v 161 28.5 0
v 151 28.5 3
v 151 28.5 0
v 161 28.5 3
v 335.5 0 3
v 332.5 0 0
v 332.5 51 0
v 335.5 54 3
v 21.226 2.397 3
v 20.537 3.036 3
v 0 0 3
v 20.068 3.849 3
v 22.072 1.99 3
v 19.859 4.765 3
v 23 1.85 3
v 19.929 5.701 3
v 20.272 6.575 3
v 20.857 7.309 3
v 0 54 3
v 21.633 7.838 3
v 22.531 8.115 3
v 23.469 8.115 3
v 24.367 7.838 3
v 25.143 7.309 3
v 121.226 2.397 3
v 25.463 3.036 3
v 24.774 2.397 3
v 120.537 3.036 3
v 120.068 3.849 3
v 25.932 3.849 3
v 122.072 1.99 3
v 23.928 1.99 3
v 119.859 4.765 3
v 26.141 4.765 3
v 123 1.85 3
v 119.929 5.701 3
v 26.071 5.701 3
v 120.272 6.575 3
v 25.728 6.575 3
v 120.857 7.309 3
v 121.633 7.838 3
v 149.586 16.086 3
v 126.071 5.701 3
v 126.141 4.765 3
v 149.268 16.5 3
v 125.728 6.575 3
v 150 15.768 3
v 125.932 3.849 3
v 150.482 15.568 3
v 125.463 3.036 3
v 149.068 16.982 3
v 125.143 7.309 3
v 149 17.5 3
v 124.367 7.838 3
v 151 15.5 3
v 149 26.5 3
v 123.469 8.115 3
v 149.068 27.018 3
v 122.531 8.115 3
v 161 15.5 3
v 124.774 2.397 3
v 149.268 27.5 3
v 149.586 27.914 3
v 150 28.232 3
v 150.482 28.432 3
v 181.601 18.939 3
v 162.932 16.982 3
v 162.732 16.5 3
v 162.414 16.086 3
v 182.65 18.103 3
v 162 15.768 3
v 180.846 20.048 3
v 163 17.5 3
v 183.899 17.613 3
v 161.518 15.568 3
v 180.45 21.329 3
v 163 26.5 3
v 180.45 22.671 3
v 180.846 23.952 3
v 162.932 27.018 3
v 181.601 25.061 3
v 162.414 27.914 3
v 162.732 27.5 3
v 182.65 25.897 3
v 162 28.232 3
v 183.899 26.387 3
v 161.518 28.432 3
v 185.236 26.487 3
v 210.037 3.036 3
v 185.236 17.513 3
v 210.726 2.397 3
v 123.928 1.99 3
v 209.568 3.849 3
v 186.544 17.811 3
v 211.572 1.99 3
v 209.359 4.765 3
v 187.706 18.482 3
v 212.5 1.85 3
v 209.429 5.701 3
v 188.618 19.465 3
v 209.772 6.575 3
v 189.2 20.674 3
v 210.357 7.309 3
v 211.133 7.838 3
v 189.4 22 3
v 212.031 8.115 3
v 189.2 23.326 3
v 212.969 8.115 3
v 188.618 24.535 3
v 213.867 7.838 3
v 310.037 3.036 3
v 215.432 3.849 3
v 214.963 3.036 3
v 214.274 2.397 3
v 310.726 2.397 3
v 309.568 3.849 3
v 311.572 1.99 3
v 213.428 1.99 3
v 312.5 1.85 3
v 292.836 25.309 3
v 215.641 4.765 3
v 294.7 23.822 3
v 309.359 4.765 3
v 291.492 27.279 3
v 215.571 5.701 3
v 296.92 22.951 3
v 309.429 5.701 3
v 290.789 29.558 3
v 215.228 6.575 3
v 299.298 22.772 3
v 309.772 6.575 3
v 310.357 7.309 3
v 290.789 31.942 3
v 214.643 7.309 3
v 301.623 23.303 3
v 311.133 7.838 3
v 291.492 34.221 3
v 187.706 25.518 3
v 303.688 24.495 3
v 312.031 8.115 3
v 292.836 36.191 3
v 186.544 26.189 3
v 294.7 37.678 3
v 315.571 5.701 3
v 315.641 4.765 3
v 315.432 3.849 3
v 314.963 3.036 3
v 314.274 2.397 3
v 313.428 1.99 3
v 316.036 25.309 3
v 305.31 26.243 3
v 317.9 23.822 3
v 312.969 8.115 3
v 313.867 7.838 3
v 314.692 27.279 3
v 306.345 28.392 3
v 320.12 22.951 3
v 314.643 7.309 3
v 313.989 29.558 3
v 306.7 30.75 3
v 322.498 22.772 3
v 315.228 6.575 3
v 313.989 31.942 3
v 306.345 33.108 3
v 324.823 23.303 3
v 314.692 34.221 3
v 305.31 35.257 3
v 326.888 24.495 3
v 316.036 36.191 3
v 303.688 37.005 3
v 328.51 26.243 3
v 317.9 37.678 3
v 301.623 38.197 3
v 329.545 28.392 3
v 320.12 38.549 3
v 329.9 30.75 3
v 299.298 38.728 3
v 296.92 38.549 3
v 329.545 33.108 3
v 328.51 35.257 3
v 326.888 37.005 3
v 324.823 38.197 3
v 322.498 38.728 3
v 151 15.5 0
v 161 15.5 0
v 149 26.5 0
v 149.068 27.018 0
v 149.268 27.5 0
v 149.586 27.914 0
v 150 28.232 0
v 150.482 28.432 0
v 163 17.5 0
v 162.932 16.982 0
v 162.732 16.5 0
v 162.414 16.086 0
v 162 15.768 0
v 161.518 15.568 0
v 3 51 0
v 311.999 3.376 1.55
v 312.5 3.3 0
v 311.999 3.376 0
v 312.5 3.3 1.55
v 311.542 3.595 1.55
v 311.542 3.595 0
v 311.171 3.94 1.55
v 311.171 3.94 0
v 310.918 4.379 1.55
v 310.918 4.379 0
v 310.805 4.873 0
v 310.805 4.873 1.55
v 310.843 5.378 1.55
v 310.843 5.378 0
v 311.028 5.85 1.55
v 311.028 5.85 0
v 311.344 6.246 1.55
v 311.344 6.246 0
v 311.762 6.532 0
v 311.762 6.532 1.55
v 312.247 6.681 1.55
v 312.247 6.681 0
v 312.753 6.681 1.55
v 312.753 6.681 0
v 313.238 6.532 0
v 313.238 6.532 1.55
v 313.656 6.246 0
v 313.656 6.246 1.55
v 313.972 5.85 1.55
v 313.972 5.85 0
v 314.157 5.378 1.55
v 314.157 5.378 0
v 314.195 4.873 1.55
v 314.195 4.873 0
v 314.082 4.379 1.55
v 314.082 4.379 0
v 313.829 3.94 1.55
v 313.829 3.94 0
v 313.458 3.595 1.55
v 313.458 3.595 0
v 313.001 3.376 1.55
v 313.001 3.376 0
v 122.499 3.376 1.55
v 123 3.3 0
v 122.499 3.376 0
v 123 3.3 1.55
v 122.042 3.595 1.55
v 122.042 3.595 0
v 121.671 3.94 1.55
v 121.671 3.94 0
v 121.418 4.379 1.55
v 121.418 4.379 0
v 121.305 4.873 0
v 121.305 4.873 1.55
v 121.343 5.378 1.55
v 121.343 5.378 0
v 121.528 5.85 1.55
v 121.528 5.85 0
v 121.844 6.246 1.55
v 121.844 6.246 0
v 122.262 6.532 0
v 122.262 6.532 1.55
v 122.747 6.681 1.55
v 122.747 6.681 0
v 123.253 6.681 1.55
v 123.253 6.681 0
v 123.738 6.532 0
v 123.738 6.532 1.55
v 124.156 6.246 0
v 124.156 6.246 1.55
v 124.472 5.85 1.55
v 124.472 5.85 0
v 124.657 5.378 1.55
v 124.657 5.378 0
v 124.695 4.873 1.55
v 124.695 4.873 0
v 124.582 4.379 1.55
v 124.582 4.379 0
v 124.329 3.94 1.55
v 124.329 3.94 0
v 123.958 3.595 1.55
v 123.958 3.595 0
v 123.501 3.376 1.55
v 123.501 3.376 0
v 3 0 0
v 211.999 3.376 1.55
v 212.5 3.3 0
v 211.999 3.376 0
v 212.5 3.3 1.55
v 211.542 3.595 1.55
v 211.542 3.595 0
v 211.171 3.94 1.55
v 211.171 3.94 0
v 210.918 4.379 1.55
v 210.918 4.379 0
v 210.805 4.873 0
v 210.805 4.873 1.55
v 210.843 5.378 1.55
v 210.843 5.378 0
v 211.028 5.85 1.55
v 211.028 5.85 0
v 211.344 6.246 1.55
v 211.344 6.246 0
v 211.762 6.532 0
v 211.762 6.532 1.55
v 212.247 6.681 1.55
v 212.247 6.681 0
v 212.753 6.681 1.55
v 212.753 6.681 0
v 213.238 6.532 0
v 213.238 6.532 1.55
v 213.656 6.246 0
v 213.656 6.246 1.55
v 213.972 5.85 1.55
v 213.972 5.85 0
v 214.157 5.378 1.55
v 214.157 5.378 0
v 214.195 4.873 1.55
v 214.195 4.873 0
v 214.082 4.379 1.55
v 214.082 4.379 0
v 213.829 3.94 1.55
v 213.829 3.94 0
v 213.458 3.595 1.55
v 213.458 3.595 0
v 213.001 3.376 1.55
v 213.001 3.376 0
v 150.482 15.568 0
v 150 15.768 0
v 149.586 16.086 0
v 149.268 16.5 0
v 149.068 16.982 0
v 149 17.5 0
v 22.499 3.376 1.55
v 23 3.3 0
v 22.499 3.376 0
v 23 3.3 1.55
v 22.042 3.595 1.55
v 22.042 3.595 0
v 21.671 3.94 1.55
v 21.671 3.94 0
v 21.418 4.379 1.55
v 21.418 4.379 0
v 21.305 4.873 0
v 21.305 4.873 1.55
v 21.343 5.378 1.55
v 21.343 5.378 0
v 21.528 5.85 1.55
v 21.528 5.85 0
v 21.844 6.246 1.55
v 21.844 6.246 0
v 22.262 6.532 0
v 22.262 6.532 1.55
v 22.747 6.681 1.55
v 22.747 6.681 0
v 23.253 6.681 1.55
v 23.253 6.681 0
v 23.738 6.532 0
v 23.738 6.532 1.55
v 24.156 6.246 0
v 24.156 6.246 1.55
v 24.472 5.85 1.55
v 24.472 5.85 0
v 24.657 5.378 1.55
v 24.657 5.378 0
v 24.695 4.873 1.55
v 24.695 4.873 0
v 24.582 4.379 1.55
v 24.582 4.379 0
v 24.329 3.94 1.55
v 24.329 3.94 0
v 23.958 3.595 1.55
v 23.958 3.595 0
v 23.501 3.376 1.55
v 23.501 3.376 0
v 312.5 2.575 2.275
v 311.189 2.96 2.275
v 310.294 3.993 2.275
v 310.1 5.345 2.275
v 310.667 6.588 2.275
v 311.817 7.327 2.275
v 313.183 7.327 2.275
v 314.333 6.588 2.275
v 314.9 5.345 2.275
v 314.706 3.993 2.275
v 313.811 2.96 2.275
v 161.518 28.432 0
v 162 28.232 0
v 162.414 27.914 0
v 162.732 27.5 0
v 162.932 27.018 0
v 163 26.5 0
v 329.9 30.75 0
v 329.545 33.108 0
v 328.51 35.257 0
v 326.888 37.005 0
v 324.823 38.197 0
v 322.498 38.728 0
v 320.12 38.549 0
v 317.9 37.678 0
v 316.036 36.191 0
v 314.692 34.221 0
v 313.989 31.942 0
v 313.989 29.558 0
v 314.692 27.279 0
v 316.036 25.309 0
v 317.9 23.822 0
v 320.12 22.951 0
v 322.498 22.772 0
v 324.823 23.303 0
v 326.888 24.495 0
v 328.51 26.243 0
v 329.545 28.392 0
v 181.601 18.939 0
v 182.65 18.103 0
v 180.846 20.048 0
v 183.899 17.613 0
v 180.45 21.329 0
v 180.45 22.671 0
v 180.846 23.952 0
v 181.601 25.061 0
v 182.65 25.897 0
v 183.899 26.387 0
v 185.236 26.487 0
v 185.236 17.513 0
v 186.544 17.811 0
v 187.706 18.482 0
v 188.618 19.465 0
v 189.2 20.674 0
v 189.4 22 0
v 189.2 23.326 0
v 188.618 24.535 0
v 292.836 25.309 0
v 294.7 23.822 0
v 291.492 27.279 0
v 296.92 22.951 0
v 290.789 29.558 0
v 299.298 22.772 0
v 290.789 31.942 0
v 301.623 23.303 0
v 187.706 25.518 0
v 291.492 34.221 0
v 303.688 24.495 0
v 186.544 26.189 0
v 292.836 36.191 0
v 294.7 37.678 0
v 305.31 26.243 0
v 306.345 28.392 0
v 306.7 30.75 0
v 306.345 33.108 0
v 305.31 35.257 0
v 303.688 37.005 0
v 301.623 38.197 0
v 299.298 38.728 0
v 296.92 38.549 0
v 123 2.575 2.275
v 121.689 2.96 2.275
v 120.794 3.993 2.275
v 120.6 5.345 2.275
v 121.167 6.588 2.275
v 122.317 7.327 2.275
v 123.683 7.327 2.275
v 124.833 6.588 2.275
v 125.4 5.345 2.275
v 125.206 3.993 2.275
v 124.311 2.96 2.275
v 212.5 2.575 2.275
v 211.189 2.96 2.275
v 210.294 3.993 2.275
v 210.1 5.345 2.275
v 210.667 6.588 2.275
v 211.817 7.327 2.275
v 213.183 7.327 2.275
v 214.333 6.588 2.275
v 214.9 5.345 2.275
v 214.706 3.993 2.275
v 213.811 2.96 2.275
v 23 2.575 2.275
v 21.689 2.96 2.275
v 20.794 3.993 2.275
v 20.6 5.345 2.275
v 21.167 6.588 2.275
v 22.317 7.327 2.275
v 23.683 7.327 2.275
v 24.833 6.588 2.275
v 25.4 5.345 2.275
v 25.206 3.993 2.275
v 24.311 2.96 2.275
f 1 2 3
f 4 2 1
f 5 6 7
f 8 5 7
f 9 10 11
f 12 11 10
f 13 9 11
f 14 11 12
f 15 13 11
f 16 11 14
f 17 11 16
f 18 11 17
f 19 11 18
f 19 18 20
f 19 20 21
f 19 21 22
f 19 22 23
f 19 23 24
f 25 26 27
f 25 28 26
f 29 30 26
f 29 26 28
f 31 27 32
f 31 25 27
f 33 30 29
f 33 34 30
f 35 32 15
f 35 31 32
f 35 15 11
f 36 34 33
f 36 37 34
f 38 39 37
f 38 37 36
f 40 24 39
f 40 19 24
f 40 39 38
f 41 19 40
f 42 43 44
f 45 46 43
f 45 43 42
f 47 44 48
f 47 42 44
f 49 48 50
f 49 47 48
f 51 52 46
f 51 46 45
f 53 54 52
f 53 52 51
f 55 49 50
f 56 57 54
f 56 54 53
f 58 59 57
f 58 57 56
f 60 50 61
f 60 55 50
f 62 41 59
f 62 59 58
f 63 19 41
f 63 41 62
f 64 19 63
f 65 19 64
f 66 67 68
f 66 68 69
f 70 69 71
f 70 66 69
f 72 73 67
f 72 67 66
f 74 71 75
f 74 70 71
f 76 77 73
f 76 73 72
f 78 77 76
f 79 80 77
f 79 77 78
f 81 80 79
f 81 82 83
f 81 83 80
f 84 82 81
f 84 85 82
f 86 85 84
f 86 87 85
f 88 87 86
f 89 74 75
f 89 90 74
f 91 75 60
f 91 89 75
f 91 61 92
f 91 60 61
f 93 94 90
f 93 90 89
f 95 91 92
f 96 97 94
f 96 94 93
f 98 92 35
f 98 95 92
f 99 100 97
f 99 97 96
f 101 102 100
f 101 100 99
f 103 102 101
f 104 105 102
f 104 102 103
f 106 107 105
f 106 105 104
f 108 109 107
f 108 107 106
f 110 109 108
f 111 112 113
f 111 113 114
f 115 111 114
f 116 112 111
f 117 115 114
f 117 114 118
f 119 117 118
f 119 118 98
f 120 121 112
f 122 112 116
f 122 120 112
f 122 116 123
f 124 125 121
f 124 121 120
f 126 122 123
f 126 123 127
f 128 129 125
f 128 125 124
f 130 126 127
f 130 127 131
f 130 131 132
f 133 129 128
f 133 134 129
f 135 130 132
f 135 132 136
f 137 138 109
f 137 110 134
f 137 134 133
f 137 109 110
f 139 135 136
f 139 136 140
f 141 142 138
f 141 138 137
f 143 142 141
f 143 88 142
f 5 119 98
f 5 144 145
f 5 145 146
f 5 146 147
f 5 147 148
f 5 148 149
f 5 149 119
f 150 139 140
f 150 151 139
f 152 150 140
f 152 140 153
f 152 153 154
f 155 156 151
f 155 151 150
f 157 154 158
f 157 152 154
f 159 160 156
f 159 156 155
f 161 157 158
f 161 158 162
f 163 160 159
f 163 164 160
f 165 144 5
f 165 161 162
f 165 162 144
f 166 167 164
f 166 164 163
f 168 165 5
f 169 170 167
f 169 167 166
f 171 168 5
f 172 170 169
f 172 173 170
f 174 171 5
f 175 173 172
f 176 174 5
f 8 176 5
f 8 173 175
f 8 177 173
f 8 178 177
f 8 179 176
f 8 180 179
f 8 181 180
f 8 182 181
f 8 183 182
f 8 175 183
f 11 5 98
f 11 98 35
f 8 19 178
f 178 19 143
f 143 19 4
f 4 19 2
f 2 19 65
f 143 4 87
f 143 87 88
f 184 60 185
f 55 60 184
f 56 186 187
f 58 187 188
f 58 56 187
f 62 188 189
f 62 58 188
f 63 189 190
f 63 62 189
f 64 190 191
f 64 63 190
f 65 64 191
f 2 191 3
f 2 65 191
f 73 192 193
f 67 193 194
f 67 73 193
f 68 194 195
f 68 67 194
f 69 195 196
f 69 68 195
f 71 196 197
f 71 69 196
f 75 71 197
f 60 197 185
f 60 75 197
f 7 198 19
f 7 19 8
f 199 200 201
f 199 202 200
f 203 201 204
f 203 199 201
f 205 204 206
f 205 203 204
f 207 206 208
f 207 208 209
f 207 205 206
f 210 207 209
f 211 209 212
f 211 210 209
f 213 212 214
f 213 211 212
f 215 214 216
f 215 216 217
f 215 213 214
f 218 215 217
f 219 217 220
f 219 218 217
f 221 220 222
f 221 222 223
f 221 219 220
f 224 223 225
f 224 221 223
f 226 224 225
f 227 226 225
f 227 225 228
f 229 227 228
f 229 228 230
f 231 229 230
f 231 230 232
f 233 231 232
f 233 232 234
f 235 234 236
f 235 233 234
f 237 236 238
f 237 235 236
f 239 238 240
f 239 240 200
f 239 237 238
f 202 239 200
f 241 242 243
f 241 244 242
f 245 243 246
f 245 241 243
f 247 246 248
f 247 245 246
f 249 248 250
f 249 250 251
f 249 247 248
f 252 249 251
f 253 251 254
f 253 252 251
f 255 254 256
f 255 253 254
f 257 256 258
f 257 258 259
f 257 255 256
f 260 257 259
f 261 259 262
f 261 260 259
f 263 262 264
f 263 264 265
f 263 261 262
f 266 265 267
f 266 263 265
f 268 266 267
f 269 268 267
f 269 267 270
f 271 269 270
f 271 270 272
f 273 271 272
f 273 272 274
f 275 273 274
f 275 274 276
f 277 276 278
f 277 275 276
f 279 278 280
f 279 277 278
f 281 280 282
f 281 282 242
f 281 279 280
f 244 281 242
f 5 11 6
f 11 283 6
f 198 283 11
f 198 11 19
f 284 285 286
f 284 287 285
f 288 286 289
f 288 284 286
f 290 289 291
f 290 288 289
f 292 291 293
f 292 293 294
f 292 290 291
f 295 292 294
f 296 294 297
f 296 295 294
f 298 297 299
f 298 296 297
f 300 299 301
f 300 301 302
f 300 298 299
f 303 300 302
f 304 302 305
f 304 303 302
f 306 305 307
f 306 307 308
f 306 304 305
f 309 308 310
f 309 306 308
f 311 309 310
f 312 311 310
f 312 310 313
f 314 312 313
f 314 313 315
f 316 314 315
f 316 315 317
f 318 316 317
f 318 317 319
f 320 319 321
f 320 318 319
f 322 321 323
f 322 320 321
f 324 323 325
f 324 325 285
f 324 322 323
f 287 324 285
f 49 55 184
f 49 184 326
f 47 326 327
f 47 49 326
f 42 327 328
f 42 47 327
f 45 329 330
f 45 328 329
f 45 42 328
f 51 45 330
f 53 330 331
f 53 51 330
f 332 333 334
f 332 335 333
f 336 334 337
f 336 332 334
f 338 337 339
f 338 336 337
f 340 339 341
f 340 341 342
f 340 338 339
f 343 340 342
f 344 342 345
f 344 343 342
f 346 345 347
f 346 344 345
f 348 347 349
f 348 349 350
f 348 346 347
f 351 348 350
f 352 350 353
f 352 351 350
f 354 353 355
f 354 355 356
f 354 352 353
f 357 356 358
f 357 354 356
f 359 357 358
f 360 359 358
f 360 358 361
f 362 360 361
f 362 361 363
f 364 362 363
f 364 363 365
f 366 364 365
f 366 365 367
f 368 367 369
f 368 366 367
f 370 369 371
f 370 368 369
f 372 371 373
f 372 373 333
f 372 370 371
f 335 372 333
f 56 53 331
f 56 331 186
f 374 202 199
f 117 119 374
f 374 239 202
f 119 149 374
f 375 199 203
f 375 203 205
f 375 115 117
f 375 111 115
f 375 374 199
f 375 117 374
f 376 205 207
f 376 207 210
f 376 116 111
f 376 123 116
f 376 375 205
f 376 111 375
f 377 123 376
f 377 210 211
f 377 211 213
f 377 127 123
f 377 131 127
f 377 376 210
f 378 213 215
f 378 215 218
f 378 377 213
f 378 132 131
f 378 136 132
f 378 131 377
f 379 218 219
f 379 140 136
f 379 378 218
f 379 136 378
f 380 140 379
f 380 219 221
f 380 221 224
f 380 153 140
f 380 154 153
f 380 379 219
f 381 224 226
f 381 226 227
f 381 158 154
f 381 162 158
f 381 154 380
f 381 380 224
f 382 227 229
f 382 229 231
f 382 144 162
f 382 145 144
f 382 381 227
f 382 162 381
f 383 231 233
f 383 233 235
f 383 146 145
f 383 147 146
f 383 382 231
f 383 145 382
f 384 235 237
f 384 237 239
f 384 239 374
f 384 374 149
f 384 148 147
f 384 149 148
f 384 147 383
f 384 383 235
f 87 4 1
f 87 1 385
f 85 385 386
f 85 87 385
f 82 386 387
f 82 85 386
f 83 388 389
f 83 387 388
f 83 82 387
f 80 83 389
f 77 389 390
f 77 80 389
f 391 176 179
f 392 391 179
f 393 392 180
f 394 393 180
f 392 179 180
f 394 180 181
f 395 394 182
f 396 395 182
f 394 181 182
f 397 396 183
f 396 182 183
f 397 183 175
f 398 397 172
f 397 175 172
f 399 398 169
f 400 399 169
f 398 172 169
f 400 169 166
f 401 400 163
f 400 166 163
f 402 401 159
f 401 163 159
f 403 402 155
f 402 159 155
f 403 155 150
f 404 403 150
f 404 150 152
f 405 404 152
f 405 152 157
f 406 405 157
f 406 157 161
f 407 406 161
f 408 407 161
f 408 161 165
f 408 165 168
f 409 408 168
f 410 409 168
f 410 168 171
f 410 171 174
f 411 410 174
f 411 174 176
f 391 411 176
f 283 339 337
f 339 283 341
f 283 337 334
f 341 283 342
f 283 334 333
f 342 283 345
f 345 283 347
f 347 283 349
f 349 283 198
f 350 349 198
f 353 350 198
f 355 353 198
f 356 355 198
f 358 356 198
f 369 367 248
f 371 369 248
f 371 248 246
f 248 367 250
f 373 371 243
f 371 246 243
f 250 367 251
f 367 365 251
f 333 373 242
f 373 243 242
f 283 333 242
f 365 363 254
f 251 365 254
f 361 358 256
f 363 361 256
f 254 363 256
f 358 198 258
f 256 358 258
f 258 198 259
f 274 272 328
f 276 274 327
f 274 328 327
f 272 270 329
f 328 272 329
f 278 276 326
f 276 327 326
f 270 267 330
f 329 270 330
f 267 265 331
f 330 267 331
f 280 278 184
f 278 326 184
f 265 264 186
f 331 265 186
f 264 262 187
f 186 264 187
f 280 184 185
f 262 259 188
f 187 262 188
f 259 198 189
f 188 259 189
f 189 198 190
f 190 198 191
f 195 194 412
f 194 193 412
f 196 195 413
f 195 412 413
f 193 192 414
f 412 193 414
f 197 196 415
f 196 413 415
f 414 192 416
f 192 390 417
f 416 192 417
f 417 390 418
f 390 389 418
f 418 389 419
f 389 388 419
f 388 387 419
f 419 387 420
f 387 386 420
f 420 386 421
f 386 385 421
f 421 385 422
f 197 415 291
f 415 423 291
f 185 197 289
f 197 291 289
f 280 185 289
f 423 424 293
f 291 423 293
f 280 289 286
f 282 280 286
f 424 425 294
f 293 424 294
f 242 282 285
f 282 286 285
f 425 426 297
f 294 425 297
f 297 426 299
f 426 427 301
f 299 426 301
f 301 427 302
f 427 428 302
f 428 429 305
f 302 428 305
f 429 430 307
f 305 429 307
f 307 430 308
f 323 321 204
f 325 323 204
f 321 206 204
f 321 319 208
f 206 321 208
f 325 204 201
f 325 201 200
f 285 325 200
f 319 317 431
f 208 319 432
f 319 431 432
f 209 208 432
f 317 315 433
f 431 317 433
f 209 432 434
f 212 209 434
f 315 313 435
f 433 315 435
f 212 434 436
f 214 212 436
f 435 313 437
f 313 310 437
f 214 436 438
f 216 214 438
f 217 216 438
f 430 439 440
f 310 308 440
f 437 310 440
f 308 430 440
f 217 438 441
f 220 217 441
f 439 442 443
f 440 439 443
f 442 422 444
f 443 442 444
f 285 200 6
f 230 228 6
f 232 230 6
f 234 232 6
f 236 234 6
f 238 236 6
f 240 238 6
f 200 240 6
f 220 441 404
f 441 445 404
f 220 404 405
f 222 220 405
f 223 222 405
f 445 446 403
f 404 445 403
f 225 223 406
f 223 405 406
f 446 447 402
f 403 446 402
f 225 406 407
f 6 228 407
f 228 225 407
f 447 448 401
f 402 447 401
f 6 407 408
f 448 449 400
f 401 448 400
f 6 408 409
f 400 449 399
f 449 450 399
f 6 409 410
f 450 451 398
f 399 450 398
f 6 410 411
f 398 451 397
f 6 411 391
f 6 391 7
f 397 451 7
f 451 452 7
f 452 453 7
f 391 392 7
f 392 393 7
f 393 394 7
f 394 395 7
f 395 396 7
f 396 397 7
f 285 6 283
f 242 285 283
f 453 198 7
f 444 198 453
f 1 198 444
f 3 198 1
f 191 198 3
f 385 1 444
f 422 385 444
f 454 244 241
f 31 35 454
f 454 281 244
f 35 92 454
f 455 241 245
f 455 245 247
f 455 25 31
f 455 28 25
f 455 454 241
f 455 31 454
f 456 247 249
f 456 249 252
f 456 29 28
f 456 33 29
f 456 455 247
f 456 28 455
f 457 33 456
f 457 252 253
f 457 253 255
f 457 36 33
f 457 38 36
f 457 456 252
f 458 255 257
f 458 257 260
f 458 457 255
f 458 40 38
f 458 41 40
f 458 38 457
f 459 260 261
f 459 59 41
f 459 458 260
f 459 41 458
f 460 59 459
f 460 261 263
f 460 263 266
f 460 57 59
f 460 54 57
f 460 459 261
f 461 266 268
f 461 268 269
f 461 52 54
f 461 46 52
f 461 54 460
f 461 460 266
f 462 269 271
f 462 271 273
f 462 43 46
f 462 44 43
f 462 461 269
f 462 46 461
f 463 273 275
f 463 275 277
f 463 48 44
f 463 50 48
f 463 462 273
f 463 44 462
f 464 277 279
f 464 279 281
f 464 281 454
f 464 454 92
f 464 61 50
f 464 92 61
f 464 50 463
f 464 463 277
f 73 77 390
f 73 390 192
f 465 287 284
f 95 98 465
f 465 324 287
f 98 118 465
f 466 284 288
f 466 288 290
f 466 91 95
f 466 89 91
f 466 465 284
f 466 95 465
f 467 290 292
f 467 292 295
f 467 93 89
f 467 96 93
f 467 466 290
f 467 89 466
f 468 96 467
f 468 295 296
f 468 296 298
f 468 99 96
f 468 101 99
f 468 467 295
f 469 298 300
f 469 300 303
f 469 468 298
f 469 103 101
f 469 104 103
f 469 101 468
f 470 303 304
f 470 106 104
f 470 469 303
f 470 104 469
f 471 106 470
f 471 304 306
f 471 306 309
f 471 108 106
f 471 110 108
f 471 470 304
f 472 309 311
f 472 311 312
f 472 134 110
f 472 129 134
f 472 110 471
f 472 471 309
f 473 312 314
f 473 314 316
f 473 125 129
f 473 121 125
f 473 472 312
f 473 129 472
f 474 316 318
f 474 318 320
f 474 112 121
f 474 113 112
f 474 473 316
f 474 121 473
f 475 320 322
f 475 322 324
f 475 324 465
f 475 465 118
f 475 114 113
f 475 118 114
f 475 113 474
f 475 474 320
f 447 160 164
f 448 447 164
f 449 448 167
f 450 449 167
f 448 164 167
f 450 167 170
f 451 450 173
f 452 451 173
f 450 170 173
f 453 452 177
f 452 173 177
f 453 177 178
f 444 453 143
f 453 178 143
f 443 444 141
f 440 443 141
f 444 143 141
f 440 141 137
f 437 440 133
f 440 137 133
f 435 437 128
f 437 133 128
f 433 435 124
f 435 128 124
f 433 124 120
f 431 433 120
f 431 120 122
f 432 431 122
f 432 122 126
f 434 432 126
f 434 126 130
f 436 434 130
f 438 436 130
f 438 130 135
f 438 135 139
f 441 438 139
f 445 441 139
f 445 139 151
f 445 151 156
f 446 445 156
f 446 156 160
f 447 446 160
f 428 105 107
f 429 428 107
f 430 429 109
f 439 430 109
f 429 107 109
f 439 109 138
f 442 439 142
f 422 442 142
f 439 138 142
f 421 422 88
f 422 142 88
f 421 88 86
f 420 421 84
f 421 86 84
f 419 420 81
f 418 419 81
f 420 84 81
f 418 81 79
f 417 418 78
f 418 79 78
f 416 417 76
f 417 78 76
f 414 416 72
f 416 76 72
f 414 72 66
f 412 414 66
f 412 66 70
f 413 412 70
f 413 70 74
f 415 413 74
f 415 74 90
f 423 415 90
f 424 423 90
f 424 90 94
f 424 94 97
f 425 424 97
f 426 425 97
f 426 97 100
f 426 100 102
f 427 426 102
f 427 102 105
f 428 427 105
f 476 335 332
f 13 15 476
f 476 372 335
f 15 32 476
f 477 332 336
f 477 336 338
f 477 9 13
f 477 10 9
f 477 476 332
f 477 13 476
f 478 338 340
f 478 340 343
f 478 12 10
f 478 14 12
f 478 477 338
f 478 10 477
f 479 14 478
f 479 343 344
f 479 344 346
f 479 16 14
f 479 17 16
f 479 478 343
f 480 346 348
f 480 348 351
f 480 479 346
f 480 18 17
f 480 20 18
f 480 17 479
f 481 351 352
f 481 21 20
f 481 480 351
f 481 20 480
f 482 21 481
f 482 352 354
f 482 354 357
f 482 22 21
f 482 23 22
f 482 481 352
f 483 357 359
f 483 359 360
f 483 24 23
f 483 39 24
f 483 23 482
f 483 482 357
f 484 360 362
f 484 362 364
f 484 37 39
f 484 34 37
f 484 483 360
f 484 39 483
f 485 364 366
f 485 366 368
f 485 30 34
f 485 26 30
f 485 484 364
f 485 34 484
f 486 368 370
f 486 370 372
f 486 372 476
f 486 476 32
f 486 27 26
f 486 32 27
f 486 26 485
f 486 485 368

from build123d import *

# Parameters (mm, degrees)
SKETCH1_W                                      = 335.5
SKETCH1_H                                      = 54
BOSS_EXTRUDE1_DEPTH                            = 3
CHAMFER1_SIZE                                  = 3
CSK_FOR_M3_FLAT_HEAD_MACHINE_SCREW1_AT_2_COUNT = 2
CSK_FOR_M3_FLAT_HEAD_MACHINE_SCREW1_AT_2_PITCH = 100
CSK_FOR_M3_FLAT_HEAD_MACHINE_SCREW1_AT_3_COUNT = 2
CSK_FOR_M3_FLAT_HEAD_MACHINE_SCREW1_AT_3_PITCH = 189.5
CSK_FOR_M3_FLAT_HEAD_MACHINE_SCREW1_AT_4_COUNT = 2
CSK_FOR_M3_FLAT_HEAD_MACHINE_SCREW1_AT_4_PITCH = 289.5
SKETCH5_R                                      = 4.5
SKETCH5_R_2                                    = 8
CUT_EXTRUDE1_DEPTH                             = 340.831208102


with BuildPart() as part:
    # Sketch1 → Boss-Extrude1 (new body)
    with BuildSketch(Plane.XY):
        with Locations((167.75, 27)):
            Rectangle(SKETCH1_W, SKETCH1_H)
    extrude(amount=BOSS_EXTRUDE1_DEPTH)

    # Chamfer1
    chamfer1_edges = [part.edges().sort_by_distance(p)[0] for p in [
        (0, 27, 0),
        (167.75, 54, 0),
        (335.5, 27, 0),
    ]]
    chamfer(chamfer1_edges, length=CHAMFER1_SIZE - 0.0001)  # a hair under: the kernel refuses the full size

    # Sketch3 → CSK for M3 Flat Head Machine Screw1 (revolve, cut)
    with BuildSketch(Plane(origin=(23, 5, 3), x_dir=(0, -1, 0), z_dir=(1, 0, 0))):
        Polygon((0, 0), (0, 3), (1.7, 3), (1.7, 1.45), (3.15, 0), align=None)
    csk_for_m3_flat_head_machine_screw1 = revolve(axis=Axis((23, 5, 9.35), (0, 0, -1)), mode=Mode.SUBTRACT)

    # CSK for M3 Flat Head Machine Screw1 at 2: CSK for M3 Flat Head Machine Screw1 ×2
    with Locations(*[(i * CSK_FOR_M3_FLAT_HEAD_MACHINE_SCREW1_AT_2_PITCH, 0, 0) for i in range(1, CSK_FOR_M3_FLAT_HEAD_MACHINE_SCREW1_AT_2_COUNT)]):
        add(csk_for_m3_flat_head_machine_screw1, mode=Mode.SUBTRACT)

    # CSK for M3 Flat Head Machine Screw1 at 3: CSK for M3 Flat Head Machine Screw1 ×2
    with Locations(*[(i * CSK_FOR_M3_FLAT_HEAD_MACHINE_SCREW1_AT_3_PITCH, 0, 0) for i in range(1, CSK_FOR_M3_FLAT_HEAD_MACHINE_SCREW1_AT_3_COUNT)]):
        add(csk_for_m3_flat_head_machine_screw1, mode=Mode.SUBTRACT)

    # CSK for M3 Flat Head Machine Screw1 at 4: CSK for M3 Flat Head Machine Screw1 ×2
    with Locations(*[(i * CSK_FOR_M3_FLAT_HEAD_MACHINE_SCREW1_AT_4_PITCH, 0, 0) for i in range(1, CSK_FOR_M3_FLAT_HEAD_MACHINE_SCREW1_AT_4_COUNT)]):
        add(csk_for_m3_flat_head_machine_screw1, mode=Mode.SUBTRACT)

    # Sketch5 → Cut-Extrude1 (cut, through all)
    with BuildSketch(Plane.XY.offset(3)):
        with Locations((184.9, 22)):
            Circle(SKETCH5_R)
        with Locations((298.7, 30.75)):
            Circle(SKETCH5_R_2)
        with Locations((321.9, 30.75)):
            Circle(SKETCH5_R_2)
        with BuildLine():
            Line((151, 28.5), (161, 28.5))
            ThreePointArc((161, 28.5), (162.414213562, 27.914213562), (163, 26.5))
            Line((163, 26.5), (163, 17.5))
            ThreePointArc((163, 17.5), (162.414213562, 16.085786438), (161, 15.5))
            Line((161, 15.5), (151, 15.5))
            ThreePointArc((151, 15.5), (149.585786438, 16.085786438), (149, 17.5))
            Line((149, 17.5), (149, 26.5))
            ThreePointArc((149, 26.5), (149.585786438, 27.914213562), (151, 28.5))
        make_face()
    extrude(amount=-CUT_EXTRUDE1_DEPTH, mode=Mode.SUBTRACT)


solid = part.part
